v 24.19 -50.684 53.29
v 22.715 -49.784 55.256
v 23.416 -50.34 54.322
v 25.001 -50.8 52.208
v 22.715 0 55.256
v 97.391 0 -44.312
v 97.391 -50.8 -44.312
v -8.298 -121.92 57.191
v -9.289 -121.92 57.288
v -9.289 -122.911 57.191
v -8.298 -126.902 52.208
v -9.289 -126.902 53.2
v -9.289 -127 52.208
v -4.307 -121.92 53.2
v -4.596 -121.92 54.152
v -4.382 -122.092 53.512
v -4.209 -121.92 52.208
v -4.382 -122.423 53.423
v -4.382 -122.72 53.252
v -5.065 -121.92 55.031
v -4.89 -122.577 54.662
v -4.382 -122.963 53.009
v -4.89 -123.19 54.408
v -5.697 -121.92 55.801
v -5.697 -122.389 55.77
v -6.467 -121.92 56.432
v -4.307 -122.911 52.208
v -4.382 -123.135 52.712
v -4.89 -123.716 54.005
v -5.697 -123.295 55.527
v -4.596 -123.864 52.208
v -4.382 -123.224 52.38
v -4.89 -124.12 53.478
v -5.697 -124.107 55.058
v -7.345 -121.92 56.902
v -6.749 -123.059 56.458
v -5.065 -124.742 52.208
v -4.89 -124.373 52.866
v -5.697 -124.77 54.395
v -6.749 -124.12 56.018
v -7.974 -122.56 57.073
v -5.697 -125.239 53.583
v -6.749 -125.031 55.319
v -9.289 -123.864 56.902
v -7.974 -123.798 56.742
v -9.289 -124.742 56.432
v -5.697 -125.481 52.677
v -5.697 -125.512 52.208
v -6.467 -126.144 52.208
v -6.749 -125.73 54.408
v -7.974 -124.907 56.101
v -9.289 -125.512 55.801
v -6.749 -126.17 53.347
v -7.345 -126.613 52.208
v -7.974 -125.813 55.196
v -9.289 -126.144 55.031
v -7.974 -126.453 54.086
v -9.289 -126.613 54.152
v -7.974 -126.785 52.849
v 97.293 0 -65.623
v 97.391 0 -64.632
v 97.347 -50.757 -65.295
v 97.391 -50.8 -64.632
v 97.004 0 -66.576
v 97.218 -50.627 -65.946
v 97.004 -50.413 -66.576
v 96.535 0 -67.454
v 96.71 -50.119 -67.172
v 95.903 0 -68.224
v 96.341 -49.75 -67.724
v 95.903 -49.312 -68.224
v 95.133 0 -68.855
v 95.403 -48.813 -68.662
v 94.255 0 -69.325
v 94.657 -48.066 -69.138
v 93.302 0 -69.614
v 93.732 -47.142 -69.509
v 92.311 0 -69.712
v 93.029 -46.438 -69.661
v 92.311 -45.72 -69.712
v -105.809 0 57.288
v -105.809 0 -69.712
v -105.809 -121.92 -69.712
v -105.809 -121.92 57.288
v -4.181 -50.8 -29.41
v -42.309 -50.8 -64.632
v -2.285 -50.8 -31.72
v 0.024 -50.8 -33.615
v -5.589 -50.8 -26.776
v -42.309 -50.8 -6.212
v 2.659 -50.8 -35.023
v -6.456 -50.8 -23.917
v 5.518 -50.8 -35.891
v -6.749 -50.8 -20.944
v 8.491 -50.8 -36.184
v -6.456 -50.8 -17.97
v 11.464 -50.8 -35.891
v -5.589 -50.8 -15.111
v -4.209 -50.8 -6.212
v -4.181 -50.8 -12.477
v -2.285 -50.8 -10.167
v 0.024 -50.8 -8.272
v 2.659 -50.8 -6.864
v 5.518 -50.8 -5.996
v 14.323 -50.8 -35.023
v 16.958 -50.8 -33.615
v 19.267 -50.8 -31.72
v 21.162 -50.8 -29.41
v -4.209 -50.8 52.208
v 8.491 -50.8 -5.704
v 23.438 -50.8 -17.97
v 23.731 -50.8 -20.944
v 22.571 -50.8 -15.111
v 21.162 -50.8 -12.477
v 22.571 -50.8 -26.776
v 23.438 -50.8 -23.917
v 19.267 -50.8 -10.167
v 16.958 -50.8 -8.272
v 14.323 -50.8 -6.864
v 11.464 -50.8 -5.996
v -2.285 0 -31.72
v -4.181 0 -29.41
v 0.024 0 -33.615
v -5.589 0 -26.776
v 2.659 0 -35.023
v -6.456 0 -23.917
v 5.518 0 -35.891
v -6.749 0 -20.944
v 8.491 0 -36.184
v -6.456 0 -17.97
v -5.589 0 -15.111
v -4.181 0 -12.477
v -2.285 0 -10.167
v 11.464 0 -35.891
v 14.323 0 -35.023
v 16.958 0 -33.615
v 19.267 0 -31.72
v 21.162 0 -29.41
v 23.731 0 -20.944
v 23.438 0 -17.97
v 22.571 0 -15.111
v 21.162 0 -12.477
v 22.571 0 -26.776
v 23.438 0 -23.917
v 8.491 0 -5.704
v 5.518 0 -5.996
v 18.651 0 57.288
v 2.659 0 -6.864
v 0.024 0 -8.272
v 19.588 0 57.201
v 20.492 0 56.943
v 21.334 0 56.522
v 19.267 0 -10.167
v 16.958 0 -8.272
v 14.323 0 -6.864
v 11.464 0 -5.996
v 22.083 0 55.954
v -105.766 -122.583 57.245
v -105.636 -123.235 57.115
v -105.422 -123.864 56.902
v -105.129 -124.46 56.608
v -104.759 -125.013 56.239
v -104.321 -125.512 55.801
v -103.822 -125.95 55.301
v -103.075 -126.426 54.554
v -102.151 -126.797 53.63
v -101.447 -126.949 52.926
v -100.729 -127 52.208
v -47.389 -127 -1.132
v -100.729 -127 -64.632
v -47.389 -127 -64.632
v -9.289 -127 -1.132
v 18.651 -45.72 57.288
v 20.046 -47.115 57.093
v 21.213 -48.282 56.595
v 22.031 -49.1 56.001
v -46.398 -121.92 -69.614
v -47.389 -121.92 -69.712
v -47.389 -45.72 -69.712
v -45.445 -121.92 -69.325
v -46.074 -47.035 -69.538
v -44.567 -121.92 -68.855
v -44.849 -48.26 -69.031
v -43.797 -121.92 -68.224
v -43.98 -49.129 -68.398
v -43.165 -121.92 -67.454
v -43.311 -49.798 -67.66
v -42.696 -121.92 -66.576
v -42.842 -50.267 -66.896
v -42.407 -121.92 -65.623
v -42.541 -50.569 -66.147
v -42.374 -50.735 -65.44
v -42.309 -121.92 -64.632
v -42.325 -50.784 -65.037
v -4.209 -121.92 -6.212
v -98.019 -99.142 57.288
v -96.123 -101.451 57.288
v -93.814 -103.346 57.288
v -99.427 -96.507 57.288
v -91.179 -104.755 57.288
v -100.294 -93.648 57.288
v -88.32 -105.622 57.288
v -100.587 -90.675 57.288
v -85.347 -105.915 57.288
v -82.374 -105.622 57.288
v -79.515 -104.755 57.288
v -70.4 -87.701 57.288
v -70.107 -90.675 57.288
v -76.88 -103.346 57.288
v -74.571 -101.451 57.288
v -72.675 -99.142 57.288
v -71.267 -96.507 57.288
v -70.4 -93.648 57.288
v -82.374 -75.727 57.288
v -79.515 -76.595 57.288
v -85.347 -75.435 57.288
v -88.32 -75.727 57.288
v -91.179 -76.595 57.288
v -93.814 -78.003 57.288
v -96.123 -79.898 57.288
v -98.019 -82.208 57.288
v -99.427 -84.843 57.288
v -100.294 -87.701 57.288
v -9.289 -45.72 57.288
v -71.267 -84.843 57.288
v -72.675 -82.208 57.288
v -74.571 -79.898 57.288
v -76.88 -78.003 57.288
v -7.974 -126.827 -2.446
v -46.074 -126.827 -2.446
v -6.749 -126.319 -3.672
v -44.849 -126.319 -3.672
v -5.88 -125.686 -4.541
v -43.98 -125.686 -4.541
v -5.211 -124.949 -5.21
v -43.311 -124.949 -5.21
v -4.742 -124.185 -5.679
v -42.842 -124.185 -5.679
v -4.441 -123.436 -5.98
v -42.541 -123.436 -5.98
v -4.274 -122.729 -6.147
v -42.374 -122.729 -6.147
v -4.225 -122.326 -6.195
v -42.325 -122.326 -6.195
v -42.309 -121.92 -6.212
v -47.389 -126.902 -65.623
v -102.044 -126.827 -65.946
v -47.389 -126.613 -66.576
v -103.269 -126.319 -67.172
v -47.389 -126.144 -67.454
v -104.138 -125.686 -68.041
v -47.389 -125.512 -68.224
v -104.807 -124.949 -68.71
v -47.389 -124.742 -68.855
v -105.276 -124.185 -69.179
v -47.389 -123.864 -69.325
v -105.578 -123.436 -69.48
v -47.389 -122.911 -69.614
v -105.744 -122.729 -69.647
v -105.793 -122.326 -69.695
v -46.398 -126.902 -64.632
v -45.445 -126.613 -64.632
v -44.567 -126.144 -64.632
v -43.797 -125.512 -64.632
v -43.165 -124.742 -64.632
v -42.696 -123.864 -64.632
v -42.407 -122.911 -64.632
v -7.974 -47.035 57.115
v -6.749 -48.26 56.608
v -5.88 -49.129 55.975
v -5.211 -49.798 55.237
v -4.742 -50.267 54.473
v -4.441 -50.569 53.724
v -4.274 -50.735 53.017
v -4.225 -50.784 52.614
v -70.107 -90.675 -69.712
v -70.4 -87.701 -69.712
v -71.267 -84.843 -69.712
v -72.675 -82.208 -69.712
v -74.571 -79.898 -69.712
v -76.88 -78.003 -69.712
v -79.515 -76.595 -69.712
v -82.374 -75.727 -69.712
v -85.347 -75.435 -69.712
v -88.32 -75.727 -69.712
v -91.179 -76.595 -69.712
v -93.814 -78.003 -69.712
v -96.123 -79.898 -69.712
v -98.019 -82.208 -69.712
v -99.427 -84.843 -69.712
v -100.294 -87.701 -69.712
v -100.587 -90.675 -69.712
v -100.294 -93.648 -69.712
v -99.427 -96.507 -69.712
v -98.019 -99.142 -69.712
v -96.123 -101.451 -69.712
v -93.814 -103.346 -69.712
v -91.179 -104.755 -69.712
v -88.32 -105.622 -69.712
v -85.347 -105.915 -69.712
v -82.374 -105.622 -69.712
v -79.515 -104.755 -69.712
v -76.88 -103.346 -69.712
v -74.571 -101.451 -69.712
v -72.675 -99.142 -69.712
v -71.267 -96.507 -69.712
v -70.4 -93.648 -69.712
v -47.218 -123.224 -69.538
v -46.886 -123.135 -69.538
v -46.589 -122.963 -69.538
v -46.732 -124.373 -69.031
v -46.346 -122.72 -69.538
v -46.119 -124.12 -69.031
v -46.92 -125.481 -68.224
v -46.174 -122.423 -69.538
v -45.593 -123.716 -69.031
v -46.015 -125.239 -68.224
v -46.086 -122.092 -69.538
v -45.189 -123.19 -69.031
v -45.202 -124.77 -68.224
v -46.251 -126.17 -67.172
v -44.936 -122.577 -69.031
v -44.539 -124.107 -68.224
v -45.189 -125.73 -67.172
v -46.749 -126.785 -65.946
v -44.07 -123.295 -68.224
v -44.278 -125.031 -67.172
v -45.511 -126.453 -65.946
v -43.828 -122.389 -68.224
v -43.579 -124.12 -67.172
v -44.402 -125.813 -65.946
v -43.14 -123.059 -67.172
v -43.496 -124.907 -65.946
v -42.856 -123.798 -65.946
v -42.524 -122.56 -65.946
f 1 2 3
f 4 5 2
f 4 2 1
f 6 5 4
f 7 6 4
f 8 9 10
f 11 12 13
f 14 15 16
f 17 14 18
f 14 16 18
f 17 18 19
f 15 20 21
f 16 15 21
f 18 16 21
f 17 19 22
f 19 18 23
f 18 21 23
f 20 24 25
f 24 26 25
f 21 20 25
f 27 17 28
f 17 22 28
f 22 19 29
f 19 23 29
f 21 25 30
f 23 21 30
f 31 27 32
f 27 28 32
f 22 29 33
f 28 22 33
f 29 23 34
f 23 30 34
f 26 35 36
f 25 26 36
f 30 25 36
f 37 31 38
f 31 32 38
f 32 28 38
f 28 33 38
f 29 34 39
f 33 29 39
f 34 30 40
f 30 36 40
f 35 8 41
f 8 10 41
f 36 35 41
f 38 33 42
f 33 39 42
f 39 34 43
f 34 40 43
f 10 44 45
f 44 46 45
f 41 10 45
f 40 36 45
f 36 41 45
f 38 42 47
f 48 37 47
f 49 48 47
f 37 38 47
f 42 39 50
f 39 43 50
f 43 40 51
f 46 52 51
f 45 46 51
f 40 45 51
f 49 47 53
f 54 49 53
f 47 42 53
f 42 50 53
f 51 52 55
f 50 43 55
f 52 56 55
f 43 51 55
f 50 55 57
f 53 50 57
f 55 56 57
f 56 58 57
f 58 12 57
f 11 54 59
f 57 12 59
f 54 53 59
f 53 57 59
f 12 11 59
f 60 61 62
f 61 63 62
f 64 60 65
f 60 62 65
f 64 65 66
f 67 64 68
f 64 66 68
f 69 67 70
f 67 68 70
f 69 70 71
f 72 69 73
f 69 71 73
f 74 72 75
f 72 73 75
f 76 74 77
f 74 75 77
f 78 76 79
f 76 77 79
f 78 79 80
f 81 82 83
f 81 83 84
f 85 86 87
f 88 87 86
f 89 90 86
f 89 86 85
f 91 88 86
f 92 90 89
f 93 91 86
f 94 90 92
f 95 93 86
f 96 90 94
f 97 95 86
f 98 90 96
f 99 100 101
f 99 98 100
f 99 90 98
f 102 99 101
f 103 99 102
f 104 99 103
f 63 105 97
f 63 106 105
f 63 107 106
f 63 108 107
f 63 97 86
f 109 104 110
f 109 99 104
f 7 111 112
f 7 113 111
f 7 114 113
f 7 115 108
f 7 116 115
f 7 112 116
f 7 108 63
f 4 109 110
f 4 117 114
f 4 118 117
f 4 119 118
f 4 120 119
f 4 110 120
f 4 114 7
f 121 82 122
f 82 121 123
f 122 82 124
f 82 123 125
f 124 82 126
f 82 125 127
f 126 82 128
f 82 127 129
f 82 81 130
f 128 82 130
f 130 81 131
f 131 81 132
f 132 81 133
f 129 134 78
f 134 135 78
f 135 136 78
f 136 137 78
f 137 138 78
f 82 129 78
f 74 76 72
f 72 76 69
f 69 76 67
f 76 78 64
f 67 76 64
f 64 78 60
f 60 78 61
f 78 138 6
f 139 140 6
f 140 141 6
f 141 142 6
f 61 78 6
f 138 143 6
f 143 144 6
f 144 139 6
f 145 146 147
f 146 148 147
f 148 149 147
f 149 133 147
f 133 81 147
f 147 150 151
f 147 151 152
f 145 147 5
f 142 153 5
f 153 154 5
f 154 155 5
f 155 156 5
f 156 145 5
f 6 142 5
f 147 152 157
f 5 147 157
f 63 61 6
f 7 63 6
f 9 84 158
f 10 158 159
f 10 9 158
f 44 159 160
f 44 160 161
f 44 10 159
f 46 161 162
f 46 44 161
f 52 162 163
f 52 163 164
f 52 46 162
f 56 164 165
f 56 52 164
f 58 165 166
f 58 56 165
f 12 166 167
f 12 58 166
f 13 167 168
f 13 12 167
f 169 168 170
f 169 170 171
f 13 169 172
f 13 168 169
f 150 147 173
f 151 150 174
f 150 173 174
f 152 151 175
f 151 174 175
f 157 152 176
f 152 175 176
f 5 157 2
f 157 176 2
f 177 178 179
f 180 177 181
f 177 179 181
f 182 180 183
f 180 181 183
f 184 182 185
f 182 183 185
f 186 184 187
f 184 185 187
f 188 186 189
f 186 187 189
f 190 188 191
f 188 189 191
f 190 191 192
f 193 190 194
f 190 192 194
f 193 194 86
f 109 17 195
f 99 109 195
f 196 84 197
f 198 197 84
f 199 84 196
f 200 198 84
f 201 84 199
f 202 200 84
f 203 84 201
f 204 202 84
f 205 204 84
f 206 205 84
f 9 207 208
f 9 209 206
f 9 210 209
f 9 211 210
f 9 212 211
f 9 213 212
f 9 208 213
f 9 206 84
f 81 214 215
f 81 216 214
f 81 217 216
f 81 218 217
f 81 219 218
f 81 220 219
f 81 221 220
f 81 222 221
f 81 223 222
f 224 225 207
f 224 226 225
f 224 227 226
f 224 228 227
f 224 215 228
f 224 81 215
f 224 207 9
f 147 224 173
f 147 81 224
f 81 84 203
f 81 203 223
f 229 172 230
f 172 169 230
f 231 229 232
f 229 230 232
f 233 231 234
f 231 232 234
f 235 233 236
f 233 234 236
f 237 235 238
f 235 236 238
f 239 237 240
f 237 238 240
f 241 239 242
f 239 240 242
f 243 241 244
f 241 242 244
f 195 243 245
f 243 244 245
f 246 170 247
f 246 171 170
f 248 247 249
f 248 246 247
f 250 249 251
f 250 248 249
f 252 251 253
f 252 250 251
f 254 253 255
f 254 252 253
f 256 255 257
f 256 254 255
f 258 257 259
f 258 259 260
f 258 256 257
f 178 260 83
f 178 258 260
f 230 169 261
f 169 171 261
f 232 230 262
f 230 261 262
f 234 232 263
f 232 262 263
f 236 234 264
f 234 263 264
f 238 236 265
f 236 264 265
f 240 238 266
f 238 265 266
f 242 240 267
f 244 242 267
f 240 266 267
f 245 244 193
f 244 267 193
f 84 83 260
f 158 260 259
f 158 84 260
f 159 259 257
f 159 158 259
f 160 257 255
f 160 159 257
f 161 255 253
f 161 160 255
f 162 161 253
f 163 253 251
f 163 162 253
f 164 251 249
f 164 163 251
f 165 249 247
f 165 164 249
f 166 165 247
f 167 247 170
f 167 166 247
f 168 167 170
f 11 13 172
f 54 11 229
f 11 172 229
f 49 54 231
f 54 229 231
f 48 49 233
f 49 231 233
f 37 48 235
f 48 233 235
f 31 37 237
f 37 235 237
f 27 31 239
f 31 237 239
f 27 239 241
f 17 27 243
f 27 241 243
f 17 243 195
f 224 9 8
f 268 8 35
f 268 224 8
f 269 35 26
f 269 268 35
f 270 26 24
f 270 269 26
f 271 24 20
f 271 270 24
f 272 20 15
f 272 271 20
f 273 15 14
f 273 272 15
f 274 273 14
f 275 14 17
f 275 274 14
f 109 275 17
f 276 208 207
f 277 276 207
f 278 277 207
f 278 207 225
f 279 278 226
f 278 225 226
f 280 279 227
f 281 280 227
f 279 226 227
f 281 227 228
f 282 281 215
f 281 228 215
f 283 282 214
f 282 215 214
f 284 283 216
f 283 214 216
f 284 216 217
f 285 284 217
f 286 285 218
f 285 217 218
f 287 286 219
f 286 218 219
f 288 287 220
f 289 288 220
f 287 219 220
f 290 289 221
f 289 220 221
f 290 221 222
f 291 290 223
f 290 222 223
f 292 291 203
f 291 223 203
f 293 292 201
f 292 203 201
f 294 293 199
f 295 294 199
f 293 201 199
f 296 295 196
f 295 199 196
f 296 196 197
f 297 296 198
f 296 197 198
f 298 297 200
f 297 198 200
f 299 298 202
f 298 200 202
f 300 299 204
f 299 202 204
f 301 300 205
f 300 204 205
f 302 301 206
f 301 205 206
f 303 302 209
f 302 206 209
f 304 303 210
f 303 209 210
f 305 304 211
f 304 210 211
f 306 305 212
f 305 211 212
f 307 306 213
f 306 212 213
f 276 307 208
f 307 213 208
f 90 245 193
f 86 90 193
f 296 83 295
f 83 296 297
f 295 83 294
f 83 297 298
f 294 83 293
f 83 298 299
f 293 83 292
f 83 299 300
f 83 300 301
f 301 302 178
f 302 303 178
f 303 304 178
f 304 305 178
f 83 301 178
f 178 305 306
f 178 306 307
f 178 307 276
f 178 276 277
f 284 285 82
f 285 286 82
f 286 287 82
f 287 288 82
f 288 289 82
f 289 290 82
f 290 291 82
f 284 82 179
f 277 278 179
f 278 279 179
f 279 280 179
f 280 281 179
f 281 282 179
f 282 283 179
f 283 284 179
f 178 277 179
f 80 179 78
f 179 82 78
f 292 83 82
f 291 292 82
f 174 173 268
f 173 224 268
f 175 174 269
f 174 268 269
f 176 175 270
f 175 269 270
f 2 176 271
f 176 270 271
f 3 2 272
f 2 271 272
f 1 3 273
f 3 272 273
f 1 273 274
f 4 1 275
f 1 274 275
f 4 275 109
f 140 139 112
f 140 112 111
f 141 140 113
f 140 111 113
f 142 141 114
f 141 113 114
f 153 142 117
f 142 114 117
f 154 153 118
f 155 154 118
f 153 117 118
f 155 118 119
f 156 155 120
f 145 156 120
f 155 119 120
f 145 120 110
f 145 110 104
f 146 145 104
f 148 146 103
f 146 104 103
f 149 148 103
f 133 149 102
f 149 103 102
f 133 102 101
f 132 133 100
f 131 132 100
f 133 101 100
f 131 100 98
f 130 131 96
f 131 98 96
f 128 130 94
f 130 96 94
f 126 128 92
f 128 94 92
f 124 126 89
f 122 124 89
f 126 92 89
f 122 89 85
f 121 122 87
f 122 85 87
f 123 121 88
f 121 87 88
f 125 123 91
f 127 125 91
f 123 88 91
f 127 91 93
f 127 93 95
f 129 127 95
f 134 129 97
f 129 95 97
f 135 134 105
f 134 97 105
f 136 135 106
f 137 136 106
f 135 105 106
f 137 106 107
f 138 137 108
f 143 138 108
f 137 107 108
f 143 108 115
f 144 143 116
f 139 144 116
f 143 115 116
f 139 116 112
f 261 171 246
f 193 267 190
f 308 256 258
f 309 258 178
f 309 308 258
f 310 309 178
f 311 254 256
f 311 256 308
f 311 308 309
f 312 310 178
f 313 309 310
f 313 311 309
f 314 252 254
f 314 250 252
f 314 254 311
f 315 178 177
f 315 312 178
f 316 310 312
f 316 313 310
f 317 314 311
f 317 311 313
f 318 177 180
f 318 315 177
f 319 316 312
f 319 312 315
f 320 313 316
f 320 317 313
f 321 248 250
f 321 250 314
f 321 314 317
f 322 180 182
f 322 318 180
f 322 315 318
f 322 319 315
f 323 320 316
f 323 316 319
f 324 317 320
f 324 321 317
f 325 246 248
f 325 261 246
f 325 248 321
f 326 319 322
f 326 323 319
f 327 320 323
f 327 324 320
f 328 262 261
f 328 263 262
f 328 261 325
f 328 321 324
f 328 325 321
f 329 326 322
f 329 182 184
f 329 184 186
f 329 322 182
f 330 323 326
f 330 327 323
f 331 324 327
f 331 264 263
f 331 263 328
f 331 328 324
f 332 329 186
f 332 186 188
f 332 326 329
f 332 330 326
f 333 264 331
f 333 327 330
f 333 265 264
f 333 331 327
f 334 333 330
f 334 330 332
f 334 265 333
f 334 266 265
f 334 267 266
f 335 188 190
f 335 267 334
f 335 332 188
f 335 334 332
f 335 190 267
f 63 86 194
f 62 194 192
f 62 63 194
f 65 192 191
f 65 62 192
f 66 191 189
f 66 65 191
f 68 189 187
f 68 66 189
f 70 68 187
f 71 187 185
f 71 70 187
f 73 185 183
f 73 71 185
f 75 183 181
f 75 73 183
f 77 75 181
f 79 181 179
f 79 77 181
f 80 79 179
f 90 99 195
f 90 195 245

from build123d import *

# Parameters (mm, degrees)
F0_W     = 203.2
F0_H     = 127
F1_DEPTH = 127
F3_DEPTH = 76.2
F4_SIZE2 = 101.6
F4_SIZE  = 76.2
F5_R     = 5.08
F6_R     = 15.24
F7_DEPTH = 50.8
F8_R     = 15.24
F9_DEPTH = 127


with BuildPart() as f1:
    # F0 (on Front) → F1 (new body)
    with BuildSketch(Plane.XZ):
        with Locations((-4.2091682553, -6.2115366554)):
            Rectangle(F0_W, F0_H)
    extrude(amount=F1_DEPTH)

    # F2 (on face) → F3 (cut)
    with BuildSketch(Plane.XZ.offset(127)):
        Polygon((97.3908317447, 57.2884633446), (-4.2091682553, 57.2884633446), (-4.2091682553, -6.2115366554), (-42.3091682553, -6.2115366554), (-42.3091682553, -69.7115366554), (97.3908317447, -69.7115366554), align=None)
    extrude(amount=-F3_DEPTH, mode=Mode.SUBTRACT)

    # F4
    f4_edges = [f1.edges().sort_by_distance(p)[0] for p in [
        (97.390832, -25.4, 57.288463),
    ]]
    f4_side = f1.faces().sort_by_distance((-25.980597, -52.614286, 57.288463))[0]
    chamfer(f4_edges, length=F4_SIZE, length2=F4_SIZE2, reference=f4_side)

    # F5
    f5_edges = [f1.edges().sort_by_distance(p)[0] for p in [
        (-55.009168, -127, 57.288463),
        (-4.209168, -88.9, 57.288463),
        (8.490832, -50.8, 57.288463),
        (21.190832, -25.4, 57.288463),
        (-4.209168, -127, 25.538463),
        (-23.259168, -127, -6.211537),
        (-42.309168, -127, -37.961537),
        (-74.059168, -127, -69.711537),
        (-105.809168, -127, -6.211537),
        (-42.309168, -88.9, -69.711537),
        (27.540832, -50.8, -69.711537),
        (97.390832, -25.4, -69.711537),
    ]]
    fillet(f5_edges, radius=F5_R)

    # F6 (on face) → F7 (cut)
    with BuildSketch(Plane.XZ.offset(50.8)):
        with Locations((8.4908317447, -20.9435366554)):
            Circle(F6_R)
    extrude(amount=-F7_DEPTH, mode=Mode.SUBTRACT)

    # F8 (on face) → F9 (cut, through all)
    with BuildSketch(Plane.XY.offset(57.2884633446)):
        with Locations((-85.3469744325, -90.6746312976)):
            Circle(F8_R)
    extrude(amount=-F9_DEPTH, mode=Mode.SUBTRACT)


solid = f1.part
